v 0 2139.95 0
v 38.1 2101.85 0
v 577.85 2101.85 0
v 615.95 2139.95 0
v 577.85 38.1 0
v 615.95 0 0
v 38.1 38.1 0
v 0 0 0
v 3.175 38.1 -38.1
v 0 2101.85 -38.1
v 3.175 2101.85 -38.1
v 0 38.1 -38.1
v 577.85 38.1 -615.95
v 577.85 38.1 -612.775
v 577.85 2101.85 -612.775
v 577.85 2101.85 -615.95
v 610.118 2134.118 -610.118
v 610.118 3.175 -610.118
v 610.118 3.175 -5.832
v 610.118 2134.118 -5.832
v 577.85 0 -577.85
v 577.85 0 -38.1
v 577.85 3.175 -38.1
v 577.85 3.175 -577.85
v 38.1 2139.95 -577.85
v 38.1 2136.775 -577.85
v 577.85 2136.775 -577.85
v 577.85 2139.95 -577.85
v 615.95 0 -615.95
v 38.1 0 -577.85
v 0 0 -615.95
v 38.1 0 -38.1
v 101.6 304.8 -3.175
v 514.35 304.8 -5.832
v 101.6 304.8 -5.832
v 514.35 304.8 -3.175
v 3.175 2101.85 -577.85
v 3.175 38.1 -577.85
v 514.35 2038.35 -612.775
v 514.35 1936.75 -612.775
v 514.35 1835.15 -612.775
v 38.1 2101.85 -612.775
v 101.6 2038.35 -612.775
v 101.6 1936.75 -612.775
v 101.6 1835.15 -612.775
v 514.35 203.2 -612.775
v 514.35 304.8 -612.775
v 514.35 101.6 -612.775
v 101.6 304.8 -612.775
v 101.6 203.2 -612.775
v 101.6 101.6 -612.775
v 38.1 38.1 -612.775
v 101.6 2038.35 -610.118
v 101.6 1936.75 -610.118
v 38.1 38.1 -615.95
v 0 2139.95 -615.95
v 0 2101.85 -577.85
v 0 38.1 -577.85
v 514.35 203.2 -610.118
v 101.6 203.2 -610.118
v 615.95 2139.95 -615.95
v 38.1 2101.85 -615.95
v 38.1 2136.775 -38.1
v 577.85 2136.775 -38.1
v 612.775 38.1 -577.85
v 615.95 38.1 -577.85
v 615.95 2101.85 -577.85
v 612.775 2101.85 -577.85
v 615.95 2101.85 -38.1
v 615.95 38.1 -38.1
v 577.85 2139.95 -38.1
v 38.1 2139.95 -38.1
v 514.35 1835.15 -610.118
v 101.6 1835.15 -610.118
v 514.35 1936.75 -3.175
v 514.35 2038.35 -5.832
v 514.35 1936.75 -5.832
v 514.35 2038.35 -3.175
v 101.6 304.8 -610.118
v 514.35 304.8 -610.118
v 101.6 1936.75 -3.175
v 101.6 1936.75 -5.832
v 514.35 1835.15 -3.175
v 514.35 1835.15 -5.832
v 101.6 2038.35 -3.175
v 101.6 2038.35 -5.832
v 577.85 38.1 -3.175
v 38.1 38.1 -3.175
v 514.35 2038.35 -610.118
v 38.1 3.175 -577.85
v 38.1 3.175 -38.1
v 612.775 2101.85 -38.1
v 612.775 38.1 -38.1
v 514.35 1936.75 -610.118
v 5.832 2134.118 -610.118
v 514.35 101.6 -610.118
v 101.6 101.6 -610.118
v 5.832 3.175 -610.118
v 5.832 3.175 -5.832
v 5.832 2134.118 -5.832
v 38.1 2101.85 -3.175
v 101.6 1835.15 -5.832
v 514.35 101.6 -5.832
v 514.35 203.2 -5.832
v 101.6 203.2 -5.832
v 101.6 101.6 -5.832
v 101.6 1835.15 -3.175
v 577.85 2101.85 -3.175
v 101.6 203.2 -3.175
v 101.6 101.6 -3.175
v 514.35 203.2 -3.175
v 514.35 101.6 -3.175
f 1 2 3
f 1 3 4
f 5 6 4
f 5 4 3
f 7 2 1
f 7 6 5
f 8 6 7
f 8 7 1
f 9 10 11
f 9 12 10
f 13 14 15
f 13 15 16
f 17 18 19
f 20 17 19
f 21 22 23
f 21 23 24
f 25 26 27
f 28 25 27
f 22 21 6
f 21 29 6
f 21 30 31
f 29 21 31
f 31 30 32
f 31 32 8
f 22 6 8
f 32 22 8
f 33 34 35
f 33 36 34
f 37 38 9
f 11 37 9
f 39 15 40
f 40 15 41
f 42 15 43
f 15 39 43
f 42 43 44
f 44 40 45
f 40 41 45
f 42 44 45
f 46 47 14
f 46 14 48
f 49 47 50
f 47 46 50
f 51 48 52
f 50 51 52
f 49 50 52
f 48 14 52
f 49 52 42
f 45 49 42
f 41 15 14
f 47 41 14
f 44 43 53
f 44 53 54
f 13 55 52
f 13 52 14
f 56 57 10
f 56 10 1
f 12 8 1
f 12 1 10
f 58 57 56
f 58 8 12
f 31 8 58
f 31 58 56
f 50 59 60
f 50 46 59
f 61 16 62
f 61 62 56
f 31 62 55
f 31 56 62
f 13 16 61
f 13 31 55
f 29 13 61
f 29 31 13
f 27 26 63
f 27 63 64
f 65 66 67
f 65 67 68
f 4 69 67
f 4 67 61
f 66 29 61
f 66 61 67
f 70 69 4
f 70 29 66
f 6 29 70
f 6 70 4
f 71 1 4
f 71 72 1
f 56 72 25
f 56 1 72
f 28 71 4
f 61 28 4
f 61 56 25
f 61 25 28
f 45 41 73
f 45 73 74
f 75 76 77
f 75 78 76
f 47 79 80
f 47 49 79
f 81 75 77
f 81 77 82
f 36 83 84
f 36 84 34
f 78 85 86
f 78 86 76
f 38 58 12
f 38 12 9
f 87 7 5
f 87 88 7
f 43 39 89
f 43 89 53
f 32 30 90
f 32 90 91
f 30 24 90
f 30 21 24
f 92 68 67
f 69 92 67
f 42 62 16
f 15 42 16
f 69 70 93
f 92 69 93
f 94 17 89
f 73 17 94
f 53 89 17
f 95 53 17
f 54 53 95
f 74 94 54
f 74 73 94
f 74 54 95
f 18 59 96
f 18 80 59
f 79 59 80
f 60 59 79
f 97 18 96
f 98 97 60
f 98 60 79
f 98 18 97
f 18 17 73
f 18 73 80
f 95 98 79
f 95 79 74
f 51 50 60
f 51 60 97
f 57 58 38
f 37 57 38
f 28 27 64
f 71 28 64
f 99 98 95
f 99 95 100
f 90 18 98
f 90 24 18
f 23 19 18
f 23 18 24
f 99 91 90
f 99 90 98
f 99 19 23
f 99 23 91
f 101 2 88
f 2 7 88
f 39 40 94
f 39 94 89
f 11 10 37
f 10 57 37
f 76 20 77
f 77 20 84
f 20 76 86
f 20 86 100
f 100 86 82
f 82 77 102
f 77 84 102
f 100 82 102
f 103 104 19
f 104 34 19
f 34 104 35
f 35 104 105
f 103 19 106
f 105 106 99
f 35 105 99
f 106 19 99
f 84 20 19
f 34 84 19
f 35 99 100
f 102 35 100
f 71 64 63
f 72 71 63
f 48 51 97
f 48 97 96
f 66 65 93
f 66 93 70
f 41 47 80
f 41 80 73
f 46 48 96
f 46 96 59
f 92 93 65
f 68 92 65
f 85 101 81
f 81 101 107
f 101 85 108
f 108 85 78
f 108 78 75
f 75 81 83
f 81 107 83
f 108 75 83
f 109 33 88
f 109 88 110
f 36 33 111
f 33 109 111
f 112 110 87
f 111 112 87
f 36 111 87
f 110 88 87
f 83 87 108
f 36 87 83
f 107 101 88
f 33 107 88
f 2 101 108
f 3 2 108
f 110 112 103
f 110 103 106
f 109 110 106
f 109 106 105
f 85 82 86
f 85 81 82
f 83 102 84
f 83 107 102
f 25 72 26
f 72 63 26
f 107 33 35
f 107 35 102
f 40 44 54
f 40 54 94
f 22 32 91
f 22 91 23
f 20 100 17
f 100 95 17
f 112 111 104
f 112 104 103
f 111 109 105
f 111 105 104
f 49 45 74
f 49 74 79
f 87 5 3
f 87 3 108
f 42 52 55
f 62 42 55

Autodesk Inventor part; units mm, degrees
ref_plane "YZ Plane" through (0, 0, 0) normal (1, 0, 0) x (0, 1, 0)
ref_plane "XZ Plane" through (0, 0, 0) normal (0, 1, 0) x (-1, 0, 0)
sketch "Sketch1" plane through (0, 0, 0) normal (0, 1, 0) x (-1, 0, 0)
  line L0 (0, 0) -> (-615.95, 0)
  line L1 (-615.95, 0) -> (-615.95, -615.95)
  line L2 (-615.95, -615.95) -> (0, -615.95)
  line L3 (0, -615.95) -> (0, 0)
  line L4 (-38.1, -38.1) -> (-577.85, -38.1)
  line L5 (-577.85, -38.1) -> (-577.85, -577.85)
  line L6 (-577.85, -577.85) -> (-38.1, -577.85)
  line L7 (-38.1, -577.85) -> (-38.1, -38.1)
  dimension "d0" = 615.95
  dimension "d2" = 615.95
  dimension "d3" = 38.1
  dimension "d4" = 38.1
  dimension "d5" = 38.1
  dimension "d6" = 38.1
extrude "Extrusion1" add sketch "Sketch1" along normal blind 3.175
sketch "Sketch2" plane through (0, 3.175, 0) normal (0, 1, 0) x (1, 0, 0)
  line L0 (0, 0) -> (615.95, 0) projected
  line L1 (615.95, 0) -> (615.95, 615.95) projected
  line L2 (0, 0) -> (615.95, 0)
  line L3 (615.95, 0) -> (615.95, 615.95)
  line L4 (615.95, 615.95) -> (0, 615.95)
  line L5 (0, 615.95) -> (0, 0)
  line L6 (3.175, 3.175) -> (612.775, 3.175)
  line L7 (612.775, 3.175) -> (612.775, 612.775)
  line L8 (612.775, 612.775) -> (3.175, 612.775)
  line L9 (3.175, 612.775) -> (3.175, 3.175)
  dimension "d9" = 3.175
  dimension "d11" = 3.175
  dimension "d12" = 3.175
  dimension "d13" = 3.175
extrude "Extrusion2" add sketch "Sketch2" along normal blind 34.925
sketch "Sketch3" plane through (0, 38.1, 0) normal (0, 1, 0) x (1, 0, 0)
  line L0 (3.175, 3.175) -> (3.175, 612.775) projected
  line L1 (612.775, 3.175) -> (3.175, 3.175) projected
  line L2 (0, 0) -> (615.95, 0) projected
  line L3 (0, 615.95) -> (0, 0) projected
  line L4 (3.175, 3.175) -> (3.175, 38.1)
  line L5 (0, 38.1) -> (0, 0)
  line L6 (38.1, 0) -> (38.1, 3.175)
  line L7 (0, 38.1) -> (3.175, 38.1)
  dimension "d16" = 38.1
  dimension "d17" = 38.1
  dimension "d18" = 38.1
extrude "Extrusion3" add sketch "Sketch3" along normal blind 2063.75
sketch "Sketch4" plane through (0, 38.1, 0) normal (0, 1, 0) x (1, 0, 0)
  line L0 (612.775, 612.775) -> (612.775, 3.175) projected
  line L1 (612.775, 3.175) -> (38.1, 3.175) projected
  line L2 (38.1, 0) -> (615.95, 0) projected
  line L3 (615.95, 0) -> (615.95, 615.95) projected
  line L4 (612.775, 3.175) -> (577.85, 3.175)
  line L5 (577.85, 0) -> (615.95, 0)
  line L6 (615.95, 38.1) -> (612.775, 38.1)
  line L7 (577.85, 0) -> (577.85, 3.175)
  point P0 (0, 0)
  dimension "d21" = 38.1
  dimension "d22" = 38.1
  dimension "d23" = 34.925
extrude "Extrusion4" add sketch "Sketch4" along normal blind 2063.75
sketch "Sketch5" plane through (0, 38.1, 0) normal (0, 1, 0) x (1, 0, 0)
  line L0 (615.95, 38.1) -> (615.95, 615.95) projected
  line L1 (615.95, 615.95) -> (0, 615.95) projected
  line L2 (3.175, 612.775) -> (612.775, 612.775) projected
  line L3 (612.775, 612.775) -> (612.775, 38.1) projected
  line L4 (612.775, 612.775) -> (577.85, 612.775)
  line L5 (577.85, 615.95) -> (615.95, 615.95)
  line L6 (615.95, 577.85) -> (612.775, 577.85)
  line L7 (577.85, 612.775) -> (577.85, 615.95)
  point P0 (0, 0)
  dimension "d26" = 38.1
  dimension "d27" = 38.1
  dimension "d28" = 38.1
extrude "Extrusion5" add sketch "Sketch5" along normal blind 2063.75
sketch "Sketch6" plane through (0, 38.1, 0) normal (0, 1, 0) x (1, 0, 0)
  line L0 (577.85, 615.95) -> (0, 615.95) projected
  line L1 (0, 615.95) -> (0, 38.1) projected
  line L2 (3.175, 38.1) -> (3.175, 612.775) projected
  line L3 (3.175, 612.775) -> (577.85, 612.775) projected
  line L4 (0, 615.95) -> (0, 577.85)
  line L5 (3.175, 577.85) -> (3.175, 612.775)
  line L6 (38.1, 612.775) -> (38.1, 615.95)
  line L7 (0, 577.85) -> (3.175, 577.85)
  point P0 (0, 0)
  dimension "d31" = 38.1
  dimension "d32" = 38.1
  dimension "d33" = 38.1
extrude "Extrusion6" add sketch "Sketch6" along normal blind 2063.75
sketch "Sketch7" plane through (0, 3.175, 0) normal (0, 1, 0) x (1, 0, 0)
  line L0 (3.175, 612.775) -> (3.175, 3.175) projected
  line L1 (3.175, 612.775) -> (5.8318, 612.775)
  line L2 (5.8318, 612.775) -> (5.8318, 3.175)
  line L3 (5.8318, 3.175) -> (3.175, 3.175)
  line L4 (3.175, 3.175) -> (3.175, 612.775)
  point P0 (0, 0)
  dimension "d36" = 609.6
  dimension "d38" = 2.6568
extrude "Extrusion7" add sketch "Sketch7" along normal blind 2133.6
sketch "Sketch8" plane through (0, 3.175, 0) normal (0, 1, 0) x (1, 0, 0)
  line L0 (612.775, 3.175) -> (612.775, 612.775) projected
  line L1 (612.775, 612.775) -> (610.1182, 612.775)
  line L2 (610.1182, 612.775) -> (610.1182, 3.175)
  line L3 (610.1182, 3.175) -> (612.775, 3.175)
  line L4 (612.775, 3.175) -> (612.775, 612.775)
  point P0 (0, 0)
  dimension "d41" = 609.6
  dimension "d43" = 2.6568
extrude "Extrusion8" add sketch "Sketch8" along normal blind 2133.6
sketch "Sketch9" plane through (0, 3.175, 0) normal (0, 1, 0) x (1, 0, 0)
  line L0 (610.1182, 612.775) -> (5.8318, 612.775) projected
  line L1 (5.8318, 612.775) -> (610.1182, 612.775)
  line L2 (610.1182, 612.775) -> (610.1182, 610.1182)
  line L3 (610.1182, 610.1182) -> (5.8318, 610.1182)
  line L4 (5.8318, 610.1182) -> (5.8318, 612.775)
  point P0 (0, 0)
  dimension "d46" = 604.2863
  dimension "d48" = 2.6568
extrude "Extrusion9" add sketch "Sketch9" along normal blind 2133.6
sketch "Sketch10" plane through (0, 3.175, 0) normal (0, 1, 0) x (1, 0, 0)
  line L0 (5.8318, 3.175) -> (610.1182, 3.175) projected
  line L1 (5.8318, 3.175) -> (610.1182, 3.175)
  line L2 (610.1182, 3.175) -> (610.1182, 5.8318)
  line L3 (610.1182, 5.8318) -> (5.8318, 5.8318)
  line L4 (5.8318, 5.8318) -> (5.8318, 3.175)
  point P0 (0, 0)
  dimension "d51" = 604.2863
  dimension "d53" = 2.6568
extrude "Extrusion10" add sketch "Sketch10" along normal blind 2133.6
sketch "Sketch11" plane through (0, 2101.85, 0) normal (0, 1, 0) x (1, 0, 0)
  line L0 (577.85, 0) -> (615.95, 0) projected
  line L1 (612.775, 38.1) -> (612.775, 3.175) projected
  line L2 (615.95, 0) -> (0, 0)
  line L3 (0, 0) -> (0, 615.95)
  line L4 (0, 615.95) -> (615.95, 615.95)
  line L5 (615.95, 615.95) -> (615.95, 0)
  line L6 (612.775, 3.175) -> (3.175, 3.175)
  line L7 (3.175, 3.175) -> (3.175, 612.775)
  line L8 (3.175, 612.775) -> (612.775, 612.775)
  line L9 (612.775, 612.775) -> (612.775, 3.175)
  point P0 (0, 0)
  dimension "d56" = 615.95
  dimension "d58" = 615.95
  dimension "d59" = 609.6
  dimension "d60" = 609.6
extrude "Extrusion11" add sketch "Sketch11" along normal blind 38.1
sketch "Sketch12" plane through (0, 2136.775, 0) normal (0, 1, 0) x (1, 0, 0)
  line L0 (3.175, 612.775) -> (3.175, 3.175) projected
  line L1 (3.175, 612.775) -> (612.775, 612.775)
  line L2 (612.775, 612.775) -> (612.775, 3.175)
  line L3 (612.775, 3.175) -> (3.175, 3.175)
  line L4 (3.175, 3.175) -> (3.175, 612.775)
  line L5 (38.1, 577.85) -> (577.85, 577.85)
  line L6 (577.85, 577.85) -> (577.85, 38.1)
  line L7 (577.85, 38.1) -> (38.1, 38.1)
  line L8 (38.1, 38.1) -> (38.1, 577.85)
  line L9 (0, 615.95) -> (0, 0) projected
  line L10 (615.95, 615.95) -> (0, 615.95) projected
  dimension "d63" = 609.6
  dimension "d65" = 609.6
  dimension "d66" = 38.1
  dimension "d67" = 38.1
  dimension "d68" = 539.75
  dimension "d69" = 539.75
extrude "Extrusion12" add sketch "Sketch12" along normal blind 3.175
ref_plane "Work Plane1" through (0, 2134.1182, 0) normal (0, 1, 0) x (1, 0, 0)
sketch "Sketch13" plane through (0, 2134.1182, 0) normal (0, 1, 0) x (1, 0, 0)
  line L0 (5.8318, 5.8318) -> (610.1182, 5.8318)
  line L1 (610.1182, 5.8318) -> (610.1182, 610.1182)
  line L2 (610.1182, 610.1182) -> (5.8318, 610.1182)
  line L3 (5.8318, 610.1182) -> (5.8318, 5.8318)
  line L4 (0, 0) -> (615.95, 0) projected
  line L5 (0, 615.95) -> (0, 0) projected
  dimension "d73" = 5.8318
  dimension "d74" = 5.8318
  dimension "d75" = 604.2863
  dimension "d76" = 604.2863
extrude "Extrusion13" add sketch "Sketch13" along normal blind 2.6568
sketch "Sketch14" plane through (38.1, 38.1, -3.175) normal (0, 0, 1) x (1, 0, 0)
  line L0 (539.75, 2063.75) -> (0, 2063.75) projected
  line L1 (0, 0) -> (0, 2063.75) projected
  line L2 (539.75, 0) -> (0, 0) projected
  line L3 (539.75, 0) -> (539.75, 2063.75) projected
  line L4 (63.5, 2000.25) -> (476.25, 2000.25)
  line L5 (476.25, 2000.25) -> (476.25, 1898.65)
  line L6 (476.25, 1898.65) -> (63.5, 1898.65)
  line L7 (63.5, 1898.65) -> (63.5, 2000.25)
  line L8 (63.5, 1797.05) -> (476.25, 1797.05)
  line L9 (476.25, 1797.05) -> (476.25, 266.7)
  line L10 (476.25, 266.7) -> (63.5, 266.7)
  line L11 (63.5, 266.7) -> (63.5, 1797.05)
  line L12 (63.5, 165.1) -> (476.25, 165.1)
  line L13 (476.25, 165.1) -> (476.25, 63.5)
  line L14 (476.25, 63.5) -> (63.5, 63.5)
  line L15 (63.5, 63.5) -> (63.5, 165.1)
  point P0 (-38.1, -38.1)
  dimension "d79" = 63.5
  dimension "d80" = 63.5
  dimension "d81" = 63.5
  dimension "d82" = 101.6
  dimension "d83" = 101.6
  dimension "d84" = 0
  dimension "d85" = 0
  dimension "d86" = 63.5
  dimension "d87" = 101.6
  dimension "d88" = 101.6
  dimension "d89" = 0
  dimension "d90" = 0
extrude "Extrusion14" cut sketch "Sketch14" against normal blind 2.6568 contours L4 L5 L6 L7 | L8 L9 L10 L11 | L12 L13 L14 L15
sketch "Sketch15" plane through (577.85, 38.1, -612.775) normal (0, 0, -1) x (-1, 0, 0)
  line L0 (539.75, 2063.75) -> (0, 2063.75) projected
  line L1 (0, 0) -> (0, 2063.75) projected
  line L2 (539.75, 0) -> (0, 0) projected
  line L3 (539.75, 0) -> (539.75, 2063.75) projected
  line L4 (63.5, 2000.25) -> (476.25, 2000.25)
  line L5 (476.25, 2000.25) -> (476.25, 1898.65)
  line L6 (476.25, 1898.65) -> (63.5, 1898.65)
  line L7 (63.5, 1898.65) -> (63.5, 2000.25)
  line L8 (63.5, 1797.05) -> (476.25, 1797.05)
  line L9 (476.25, 1797.05) -> (476.25, 266.7)
  line L10 (476.25, 266.7) -> (63.5, 266.7)
  line L11 (63.5, 266.7) -> (63.5, 1797.05)
  line L12 (63.5, 165.1) -> (476.25, 165.1)
  line L13 (476.25, 165.1) -> (476.25, 63.5)
  line L14 (476.25, 63.5) -> (63.5, 63.5)
  line L15 (63.5, 63.5) -> (63.5, 165.1)
  point P0 (577.85, -38.1)
  dimension "d93" = 63.5
  dimension "d94" = 63.5
  dimension "d95" = 63.5
  dimension "d96" = 101.6
  dimension "d97" = 101.6
  dimension "d98" = 0
  dimension "d99" = 0
  dimension "d100" = 101.6
  dimension "d101" = 101.6
  dimension "d102" = 63.5
  dimension "d103" = 0
  dimension "d104" = 0
extrude "Extrusion15" cut sketch "Sketch15" against normal blind 2.6568 contours L4 L5 L6 L7 | L8 L9 L10 L11 | L12 L13 L14 L15
properties part number "Cabinet_2x2x7"
